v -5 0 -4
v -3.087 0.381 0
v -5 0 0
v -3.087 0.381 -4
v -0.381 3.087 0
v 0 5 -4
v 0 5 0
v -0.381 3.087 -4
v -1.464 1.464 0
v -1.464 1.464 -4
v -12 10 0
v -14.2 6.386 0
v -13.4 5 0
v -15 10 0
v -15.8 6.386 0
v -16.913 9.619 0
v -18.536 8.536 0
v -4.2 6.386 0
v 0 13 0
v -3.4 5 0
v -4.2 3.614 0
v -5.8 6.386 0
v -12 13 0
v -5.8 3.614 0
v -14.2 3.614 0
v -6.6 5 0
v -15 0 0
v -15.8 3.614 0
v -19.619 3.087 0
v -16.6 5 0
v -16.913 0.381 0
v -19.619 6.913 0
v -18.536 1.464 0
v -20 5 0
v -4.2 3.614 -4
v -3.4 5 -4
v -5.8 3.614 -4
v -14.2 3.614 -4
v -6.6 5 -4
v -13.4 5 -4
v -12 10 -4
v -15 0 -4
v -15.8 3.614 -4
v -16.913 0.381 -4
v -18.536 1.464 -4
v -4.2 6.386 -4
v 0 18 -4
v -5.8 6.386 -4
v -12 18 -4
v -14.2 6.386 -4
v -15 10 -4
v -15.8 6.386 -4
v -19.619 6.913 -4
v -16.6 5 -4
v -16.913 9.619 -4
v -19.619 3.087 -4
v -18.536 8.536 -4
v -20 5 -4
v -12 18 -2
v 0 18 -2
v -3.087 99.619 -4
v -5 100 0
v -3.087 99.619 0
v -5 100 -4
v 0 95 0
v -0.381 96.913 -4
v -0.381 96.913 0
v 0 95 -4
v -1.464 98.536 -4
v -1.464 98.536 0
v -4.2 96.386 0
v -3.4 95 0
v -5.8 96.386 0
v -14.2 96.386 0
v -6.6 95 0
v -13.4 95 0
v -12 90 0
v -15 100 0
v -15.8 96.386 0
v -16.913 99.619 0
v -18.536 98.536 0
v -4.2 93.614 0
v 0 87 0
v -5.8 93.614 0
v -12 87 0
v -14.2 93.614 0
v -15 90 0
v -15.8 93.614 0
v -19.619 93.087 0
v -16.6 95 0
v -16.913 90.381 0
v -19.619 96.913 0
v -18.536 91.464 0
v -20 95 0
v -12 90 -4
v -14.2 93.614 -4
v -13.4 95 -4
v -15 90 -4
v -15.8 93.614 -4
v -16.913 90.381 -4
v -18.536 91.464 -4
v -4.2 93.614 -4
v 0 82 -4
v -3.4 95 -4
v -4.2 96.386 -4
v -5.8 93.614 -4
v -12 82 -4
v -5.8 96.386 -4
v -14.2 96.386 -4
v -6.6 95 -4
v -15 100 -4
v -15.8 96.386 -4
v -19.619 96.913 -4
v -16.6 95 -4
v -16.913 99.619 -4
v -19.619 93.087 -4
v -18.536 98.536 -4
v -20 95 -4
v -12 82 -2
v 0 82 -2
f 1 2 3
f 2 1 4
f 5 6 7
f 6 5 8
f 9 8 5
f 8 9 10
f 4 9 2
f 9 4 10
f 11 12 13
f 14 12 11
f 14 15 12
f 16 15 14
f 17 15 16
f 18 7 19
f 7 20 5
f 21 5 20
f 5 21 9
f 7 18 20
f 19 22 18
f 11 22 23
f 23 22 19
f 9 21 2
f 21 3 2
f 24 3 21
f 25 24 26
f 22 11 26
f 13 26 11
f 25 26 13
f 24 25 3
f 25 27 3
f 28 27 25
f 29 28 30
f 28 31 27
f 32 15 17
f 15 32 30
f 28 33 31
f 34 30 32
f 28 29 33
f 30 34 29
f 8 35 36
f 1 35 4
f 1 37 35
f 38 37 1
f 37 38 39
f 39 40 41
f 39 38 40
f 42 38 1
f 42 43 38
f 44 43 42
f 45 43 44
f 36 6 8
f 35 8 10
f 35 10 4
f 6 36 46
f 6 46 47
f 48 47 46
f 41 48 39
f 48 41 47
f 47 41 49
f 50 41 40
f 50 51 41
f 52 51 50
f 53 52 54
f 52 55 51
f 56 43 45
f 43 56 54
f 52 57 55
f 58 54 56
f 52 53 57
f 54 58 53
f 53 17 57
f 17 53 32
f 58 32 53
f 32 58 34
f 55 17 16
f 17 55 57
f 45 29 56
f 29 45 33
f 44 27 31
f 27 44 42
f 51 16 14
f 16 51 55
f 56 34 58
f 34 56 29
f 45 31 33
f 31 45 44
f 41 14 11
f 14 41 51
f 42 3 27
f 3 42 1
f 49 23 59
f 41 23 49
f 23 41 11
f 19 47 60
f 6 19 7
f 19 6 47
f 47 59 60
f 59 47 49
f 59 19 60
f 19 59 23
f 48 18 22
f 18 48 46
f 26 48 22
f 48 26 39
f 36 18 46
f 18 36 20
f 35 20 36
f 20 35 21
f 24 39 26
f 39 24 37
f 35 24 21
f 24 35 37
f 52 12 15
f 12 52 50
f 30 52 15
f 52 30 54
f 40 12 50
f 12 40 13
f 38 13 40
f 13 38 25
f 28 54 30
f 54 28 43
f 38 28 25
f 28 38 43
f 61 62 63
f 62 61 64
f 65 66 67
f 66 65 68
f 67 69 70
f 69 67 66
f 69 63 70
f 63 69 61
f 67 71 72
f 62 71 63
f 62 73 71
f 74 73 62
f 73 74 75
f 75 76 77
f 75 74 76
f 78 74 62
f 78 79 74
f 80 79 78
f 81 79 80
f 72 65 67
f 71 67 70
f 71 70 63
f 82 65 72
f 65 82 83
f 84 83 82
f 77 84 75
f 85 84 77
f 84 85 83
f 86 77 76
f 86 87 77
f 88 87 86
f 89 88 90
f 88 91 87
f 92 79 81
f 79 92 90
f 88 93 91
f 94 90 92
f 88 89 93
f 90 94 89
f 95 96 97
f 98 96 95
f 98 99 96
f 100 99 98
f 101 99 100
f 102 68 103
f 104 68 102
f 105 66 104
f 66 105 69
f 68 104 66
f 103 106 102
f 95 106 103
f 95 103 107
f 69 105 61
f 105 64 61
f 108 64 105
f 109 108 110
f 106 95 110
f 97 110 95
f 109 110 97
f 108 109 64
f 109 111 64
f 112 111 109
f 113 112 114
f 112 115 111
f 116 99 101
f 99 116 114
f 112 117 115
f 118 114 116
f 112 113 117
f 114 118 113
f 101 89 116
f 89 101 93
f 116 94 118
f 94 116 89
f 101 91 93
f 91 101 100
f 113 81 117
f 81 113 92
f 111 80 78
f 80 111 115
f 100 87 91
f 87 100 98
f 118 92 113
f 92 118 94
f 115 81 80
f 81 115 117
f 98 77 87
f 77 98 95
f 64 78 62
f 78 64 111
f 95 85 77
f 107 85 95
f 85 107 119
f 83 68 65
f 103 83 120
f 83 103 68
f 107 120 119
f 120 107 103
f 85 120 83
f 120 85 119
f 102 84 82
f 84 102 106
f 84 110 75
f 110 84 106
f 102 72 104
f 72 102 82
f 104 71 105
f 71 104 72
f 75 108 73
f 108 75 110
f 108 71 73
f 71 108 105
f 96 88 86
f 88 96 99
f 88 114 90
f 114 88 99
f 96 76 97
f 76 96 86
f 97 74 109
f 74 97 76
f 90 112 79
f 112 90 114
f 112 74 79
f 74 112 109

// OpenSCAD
// file: config_4x5.scad
/*
This is the base configuration file for the 4x5" format
# we are not using the exact ANSI measures, but slightly rounded measures for slight simplification
*/
vStabilizerTotal_h = 7;

// general tolerance
vTolerance = 0.2;

// sheet film and cassette measurements (roughly based on the ANSI measurements)
vFilmSheet_l = 127;
vFilmSheet_w = 102;
vCassette_l = 160; // A min
vCassette_w = 121; // B max
vCassette_h = 13.2; // C max
vLightTrap_l = 2; // M2
vLightTrap_w = vCassette_w;
vLightTrap_h = 1.5; // M1
vLightTrap_offsetX = 141; // G max
vFilmWindow_l = 121;
vFilmWindow_w = 101;
vFilmWindow_offsetX = 16;
vGroundGlass_offsetZ = 5;

// Graflok
vGraflok_h = 6; // this is not the official measurement, just measured from a camera 

// lens board measures (we are using Wista/Technika-style lensboards)
vLensboard_l = 100;
vLensboard_w = 97;
vLensboard_h = 2;
vLensboard_offsetX = -(vLensboard_l+3)/2; // caution: we have an asymetric offset!
vLensboard_offsetY = -vLensboard_w/2;
vLensboardHole_d = 85;
vLensboardLighttrap_d = 89;
vLensboardLighttrap_h = 1+vTolerance;

// bellows frame measures - the bellows frame design is derived from standardcameras.com
// back frame
vBellowsBackInner_l = 144; //???? check and replace with the measurement from your bellows!
vBellowsBackInner_w = vBellowsBackInner_l;
vBellowsBackOuter_l = vBellowsBackInner_l+1;
vBellowsBackOuter_w = vBellowsBackOuter_l;

vBellowsBackFrameOuter_l = 159;
vBellowsBackFrameOuter_w = vBellowsBackFrameOuter_l;
vBellowsBackFrameOuter_h = 7;
vBellowsBackFrameInner_l = 135;
vBellowsBackFrameInner_w = vBellowsBackFrameInner_l;
vBellowsBackFrameInner_h = 5;

vBellowsBackLightTrapOuter_l = vBellowsBackFrameInner_l+2*2;
vBellowsBackLightTrapOuter_w = vBellowsBackLightTrapOuter_l;
vBellowsBackLightTrap_h = 3;

//vBellowsBackFrameScrewHole_d = 2;
//vBellowsBackFrameScrewHole_h = 10;
vBellowsBackFrameScrewHole_offsetXY = 70;
vBellowsBackFrameScrewHole_offsetZ = vBellowsBackFrameOuter_h/2;

// front frame
vBellowsFrontInner_l = 94; //???? check and replace with the measurement from your bellows!
vBellowsFrontInner_w = vBellowsFrontInner_l;
vBellowsFrontOuter_l = vBellowsFrontInner_l+1;
vBellowsFrontOuter_w = vBellowsFrontOuter_l;

vBellowsFrontFrameOuter_l = 104;
vBellowsFrontFrameOuter_w = vBellowsFrontFrameOuter_l;
vBellowsFrontFrameOuter_h = 7;
vBellowsFrontFrameInner_l = 82;
vBellowsFrontFrameInner_w = vBellowsFrontFrameInner_l;
vBellowsFrontFrameInner_h = 5;

vBellowsFrontLightTrapOuter_l = vBellowsFrontFrameInner_l+2*2;
vBellowsFrontLightTrapOuter_w = vBellowsFrontLightTrapOuter_l;
vBellowsFrontLightTrap_h = 0;

//vBellowsFrontFrameScrewHole_d = 2;
//vBellowsFrontFrameScrewHole_h = 10;
vBellowsFrontFrameScrewHole_offsetXY = 40;
vBellowsFrontFrameScrewHole_offsetZ = vBellowsFrontFrameOuter_h/2;

// body dimensions
vWall_strength = 5;
vBodyOuter_l = 185; // make sure this is at least 4*vWall_strength larger than vBellowsBackFrameOuter_l!
vBodyOuter_w = 170; // make sure this is at least 2*vWall_strength larger than vBellowsBackFrameOuter_l!
vBodyOuter_h = 65;
vBodyEdge_r = vWall_strength;

// we will center our model on the Y axis and on the center of the bellows frame
// at least for the 4x5 version, we have to do an asymetric offset of 2.5mm on the X-axis 
vAsymOffsetX = -2.5;  

// back plate
vBackPlateLength = 160; // we will probably use about the same size as the bellows back frame
vBackPlateStrength = vWall_strength;

// hinges for front lid
vHingeInnerDistance = 100;
vHingeBaseWidth = 20;
vHingeHole = 4;

// lid lock measures
vLidLockBase_d = 8;
vLidLockHole_distance = 70;

// rail dimensions
vLowerRail_w = 90;
vUpperRail_w = vLowerRail_w;

// cutout for stop indents
vStopIndent_l = 4;
vStopIndent_h = 5;
vStopIndentDistance = 25; // shorter than 25 is not necessary
vStopIndent_offsetX = 20; // don't go shorter than 20 if you intend to use a 90mm lens!

// for all dovetails we use a base width of 5mm and a base height of 5mm
// we are applying tolerances to the inner AND outer part of a dovetail, in width and height
vDoveTail_w = 5;
vDoveTail_h = 5;
vDoveTail_tolerance = 0.2;

// front standard carrier / slider
// width is depending on vUpperRail_w
vSliderBase_w = vUpperRail_w + (4*vDoveTail_w);
vSliderBase_l = 40; // make sure to have enough space in the body.


// lever plate 
vLeverPlateBase_w = vUpperRail_w - (8*vDoveTail_w);
vLeverPlateBlock_w = 25;
vLeverPlateBlock_l = vSliderBase_l-(2*vDoveTail_w);

vFrontStandard_h = 130;
vFrontStandardSlot_h = vFrontStandard_h - 30;

// lensboard carrier
vFrontPlate_length = vSliderBase_w+6; // vSliderBase_w is a bit too tight for 4x5", so there we will add 5mm, for 5x7 vSliderBase_w is OK to get a squared lensboard carrier
vFrontPlate_width = vSliderBase_w; //vFrontPlate_length;
vFrontPlate_height = 16;
vEdgeCutCylinder = floor(sqrt(2*pow(vFrontPlate_width,2)))-5;

vTiltDovetailBase_d1 = 30;
vTiltDovetailBase_d2 = vTiltDovetailBase_d1+(2*vDoveTail_w);
vTiltDovetailBaseBlock_d = vTiltDovetailBase_d1+(4*vDoveTail_w);

vTiltDovetail_d1 = vTiltDovetailBase_d1-vTolerance;
vTiltDovetail_d2 = vTiltDovetailBase_d2-vTolerance;
vTiltDovetail_h = vDoveTail_w-vTolerance;

vTiltDovetailCutout_d1 = vTiltDovetailBase_d2+vTolerance;
vTiltDovetailCutout_d2 = vTiltDovetailBase_d1+vTolerance;

vAxisHole_d = 10+vTolerance;
vAxisHole_h = vDoveTail_w+vTolerance;

vTiltLockBolt_d = 12;
vTiltLockBolt_h = 14;
//vTiltLockBoltHole_d = 8;
//vTiltLockBoltHole_h = vTiltLockBolt_h;

vTiltHeight = 50;
vTiltRadius = vFrontPlate_length/2;
vTiltAngleMinus = -7;
vTiltAnglePlus = 7;
vTiltAxis_d = 10-vTolerance;

// focusing rod
vFocusingRod_d = 6;
vFocusingKnob_d = 25;
vFocusingKnob_h = 20;

// stabilizer measures (just the outer measures of our stabilizer block, not the tripod slider)
vStabilizerBase_l = 135;
vStabilizerBase_w = 90;  
vStabilizerBase_h = 7;
vStabilizerDovetailBase_w = 50;
// screw holes for the stabilizer
vLidHoleCount_x = 4;
vLidHoleDist_x = 35;
vLidHoleCount_y = 2;
vLidHoleDist_y = 60;


// screw diameters, length is individually set
vScrew1Hole_d = 3;
vScrew1ThreadHole_d = 2.2;
vScrew2Hole_d = 2;
vScrew2ThreadHole_d = 1.4;


// Dimensions for small heat set insert holes.
// Sized for M2 inserts, 3 mm depth, 3.5 mm max OD
// (may be labelled M2x3.5x3)
vInsertM2Hole_d = 3.2;
vInsertM2MinDepth_h = 4.0;
vInsertM2Size_d = 3.5;
vInsertM2Depth_h = 3.0;

// Dimensions for heat set insert holes.
// Sized for "Voron standard" M3 inserts, 4 mm depth, 5 mm max OD
// (variously labelled M3x4x5 or M3x5x4)
vInsertM3Hole_d = 4.7;
vInsertM3MinDepth_h = 5.0;
vInsertM3Size_d = 5.0;
vInsertM3Depth_h = 4.0;

// Dimensions for large heat set insert holes.
// Sized for M5 inserts, 5 mm depth, 7 mm max OD
// (may be labelled M5x7x5)
vInsertM5Hole_d = 6.7;
vInsertM5MinDepth_h = 6.0;
vInsertM5Size_d = 7.0;
vInsertM5Depth_h = 5.0;


// Handle strap
vHandleStrap_h = 2.0;       // Thickness of the strap in mm
vHandleStrap_w = 15.0;      // Width of the strap in mm
vHandleStrap_l = 145.0;     // Total length of the strap in mm
vHandleStrapMovement_l = 35.0;   // Total amount the strap moves, in mm. Each side moves half this amount.
vHandleStrapCutout_w = 4.0;      // Width of the central cutout, in mm
vHandleStrapSlotOffsetFar = vHandleStrap_l/2 - vHandleStrap_w/2;
vHandleStrapSlotOffsetNear = vHandleStrapSlotOffsetFar - vHandleStrapMovement_l/2;
vHandleStrapCoverExtra_l = 5.0;
vHandleStrapHoleSize_d = 3.0;
vStrapHoleDelta = vHandleStrapSlotOffsetNear-vHandleStrapCoverExtra_l+vHandleStrapHoleSize_d/2;
vStrapHoleSpacing = vHandleStrapMovement_l/2 + vHandleStrap_w/2;
// file: baseconfig.scad
/*
Here we define some variables which are independent from the camera format
*/


// some generic variables

// we are including a format specific configuration sheet - but make sure to include only one!

include <config_4x5.scad>;
// include <config_5x7.scad>;
// include <config_8x10.scad>;

// Arca Swiss tripod plate
// caution: some Arca Swiss compatible tripod heads may have slight variations
// vArca_length = xx; // the length is irrelevant here
vArca_width = 38;
vArca_height = 7;
vArcaBase_cutout = 4;
vArcaBase_height = 1.5;
// file: modules.scad
/*
This is a collection of the modules which are used heavily within the whole project.
Almost all parts rely on the modules to remain "as is", especially regarding their current orientation.
So please act very carefully here, otherwise you may screw up the complete design!

*/
include <baseconfig.scad>;


// roof module - this is heavily used for dovetail cutouts
// please keep as is
module roof(l, w, h){
    polyhedron(
        points=[
            [0,0,0],
            [l,0,0],
            [l,w,0],
            [0,w,0],
            [0,w/2,h],
            [l,w/2,h]
            ],
        faces=[
            [0,1,2,3],
            [0,4,1],
            [1,4,5,2],
            [2,5,3],
            [3,5,4,0]
            ]
            );
    };

// a wedge module - this is heavily used for cutting edges
// please keep as is    
module wedge(l, w, h) {
    polyhedron(
            points=[
                [0,0,0],
                [l,0,0],
                [l,w,0],
                [0,w,0],
                [0,0,h],
                [l,0,h]
            ],
            faces=[
                [0,3,2,1],
                [0,1,5,4],
                [1,2,5],
                [2,3,4,5],
                [3,0,4]
            ]
    );
   };

// simple tube module.   
module tube(d1, d2, h) {
    difference() {
        cylinder(d=d1, h=h);
        cylinder(d=d2, h=h);
        };
    };

// mainly used for making holes for countersunk screws
// please keep as is    
module countersunk_screw(vScrew_d, vScrew_l){
    union(){
    cylinder(d=vScrew_d, h=vScrew_l);
    cylinder(d1=vScrew_d*2, d2=0, h=vScrew_d);
    };
};

// module for making hexagons, e.g. hex nuts. kw is the key width
// please keep as is
module hex(kw, h) {
	render()
        translate([0, 0, h/2])
            intersection_for(a = [0, 120, 240]) {
                rotate([0, 0, a])
                    cube([kw, 3 * kw, h], true);
                }
}


// Heatset insert
// d: Thread diameter
// od: Outer diameter
// l: Total length
module insert(d, od, l)
{
    echo(Insert = d, od, l);
    difference() {
        cylinder(l, d=od, $fn=15);
        translate([0, 0, -0.5]) cylinder(l+1, d=d, $fn=15);
        };
}

module insert_m2()
{
    color("gold") insert(2, vInsertM2Size_d, vInsertM2Depth_h);
}

module insert_m3()
{
    color("gold") insert(3, vInsertM3Size_d, vInsertM3Depth_h);
}

module insert_m5()
{
    color("gold") insert(5, vInsertM5Size_d, vInsertM5Depth_h);
}

// Countersunk screw, metric, for display
// Example: https://www.aliexpress.com/item/1005007838338973.html
module screw_cs(l, d=3, dk=6, s=2, t=1) {
    // l: total length (including head) in mm
    // d: thread diameter (eg 3 for M3)
    // dk: max head diameter
    // s: hex socket flat-to-flat size
    // t: hex socket depth
    echo(CountersunkScrew = d, l);
    difference() {
        union() {
            cylinder(h=l, r=d/2, $fn=15);
            cylinder(h=(dk-d)/2, r1=dk/2, r2=d/2, $fn=15);
            }
        cylinder(h=t, r=s/2*2/sqrt(3), $fn=6);
    }
}

module screw_m3_cs(l) {
    color("silver") screw_cs(l, d=3, dk=6, s=2, t=1);
}

module screw_m2_cs(l) {
    color("silver") screw_cs(l, d=2, dk=3.8, s=1.5, t=0.75);
}
module screw_m5_cs(l) {
    color("silver") screw_cs(l, d=5, dk=9.5, s=3, t=1.6);
}

// Button head screw, metric, for display
// Example: https://www.aliexpress.com/item/32967225441.html
module screw_bh(l, d=3, k=1.5, dk=5.5, s=2, t=1) {
    // l: shaft length (NOT including head) in mm
    // d: thread diameter (eg 3 for M3)
    // k: head depth
    // dk: head max diameter
    // s: hex socket flat-to-flat size
    // t: hex socket depth
    echo(ButtonheadScrew = d, l);
    difference() {
        union() {
            translate([0, 0, k]) cylinder(h=l, r=d/2, $fn=15);
            difference() {
                translate([0, 0, k]) intersection() {
                    sphere(d=dk, $fn=15);
                    translate([-dk/2, -dk/2, -dk]) cube(dk);
                }
                translate([-dk/2, -dk/2, -dk]) cube(dk);
            }
        }
        cylinder(h=t, r=s/2*2/sqrt(3), $fn=6);
    }
}

module screw_m2_bh(l) {
    color("silver") screw_bh(l, d=2, dk=3.4, s=1.175, t=0.6);
}

module screw_m3_bh(l) {
    color("silver") screw_bh(l, d=3, dk=5.7, s=2, t=1);
}


module nut_m5() {
    echo(Nut = 5);
    difference() {
        rotate([0, 0, 30]) cylinder(h=3.9, d=8*2/sqrt(3), $fn=6);
        cylinder(h=5, d=5, $fn=15);
        }
    }
    
    
module thumbscrew(bolt_d, bolt_dk, screw_d, screw_h, n_knurls, knurl_d, knurl_f) {
    // bolt_d:  central bolt diameter
    // bolt_dk: bolt head max diameter
    // screw_d: thumbscrew outer diameter
    // screw_h: thumbscrew height
    // n_knurls: number of knurls
    
    min_knurl_offset = screw_d/2 - knurl_d;
    max_knurl_offset = screw_d/2 + knurl_d;
    knurl_offset = min_knurl_offset + knurl_f*(max_knurl_offset - min_knurl_offset);
    
    difference()
    {
        union()
        {
            translate([0, 0, 1]) cylinder(screw_h-2, d=screw_d);
            cylinder(1, d1=screw_d-1, d2=screw_d);
            translate([0, 0, screw_h-1]) cylinder(1, d1=screw_d, d2=screw_d-1);
        }
        cylinder(screw_h, d=bolt_d);
        cylinder(bolt_dk/2, d1=bolt_dk, d2=0);
        for (i = [1:n_knurls])
        {
            rotate([0, 0, i*360/(n_knurls)]) translate([knurl_offset, 0, 0]) cylinder(screw_h, d=knurl_d);
        }
    }
}

module thumbscrew_m5(screw_d, screw_h, n_knurls, knurl_d, knurl_f) {
    thumbscrew(5, 9.5, screw_d, screw_h, n_knurls, knurl_d, knurl_f);
}


module t6_flange_coupler() {
    // T6 flange coupler
    // Example: https://www.aliexpress.com/item/1005008049363389.html
    echo(FlangeCoupler = 6);
    difference() {
        union() {
            translate([0, 0, 2]) cylinder(h=10, d=10);
            cylinder(h=2, d=22);
        }
        cylinder(h=12, d=6);
        translate([0, 15, 7]) rotate([90, 0, 0]) cylinder(h=30, d=3);
        for (i = [0:3]) {
            rotate([0, 0, 45+90*i]) translate([-8, 0, 0]) cylinder(h=2, d=3);
        }
    }
}


module AXK0619_thrust_bearing() {
    echo(ThrustBearing = "AXK0619");
    difference() {
        cylinder(h=4, d=19);
        cylinder(h=4, d=6);
    }
}


module t6_lead_screw(l) {
    echo(LeadScrewT6 = l);
    color("silver") cylinder(h=l, d=6);
}

module t6_lead_screw_nut() {
    echo("LeadScrewT6Nut");
    intersection()
    {
        difference() {
            union() {
                cylinder(h=15, d=12);
                translate([0, 0, 1.5]) cylinder(h=3.5, d=24);
            }
            cylinder(h=15, d=6);
        }  
        translate([-50, -12.5/2, -50]) cube([100, 12.5, 100]);
    }
}

module threaded_rod_m5(l) {
    echo(ThreadedRodM5 = l);
    color("silver") cylinder(h=l, d=5);
}

module smooth_rod_m4(l) {
    echo(SmoothRodM4 = l);
    color("silver") cylinder(h=l, d=4);
}


module screw_m3_grub(l) {
    echo(GrubScrew = 3, l);
    color("silver") cylinder(h=l, d=3, $fn=15);
}


module screw_m5_grub(l) {
    echo(GrubScrew = 5, l);
    color("silver") cylinder(h=l, d=5, $fn=15);
}


module washer_m6() {
    // M6x12x0.8 washer
    echo(Washer = 6, 0.8);
    difference() {
        cylinder(h=0.8, d=12);
        cylinder(h=0.8, d=6.6);
    }
}


module springwasher_m6() {
    // M6x12x1.5 washer (compresses to 0.5)
    // Show as compressed (~0.5 mm height)
    echo(SpringWasher = 6);
    difference() {
        cylinder(h=0.5, d=12);
        cylinder(h=0.6, d=6);
    }
}


module chamfer_cylinder(h, d, c=0) {
    if (h >= c) {
        cylinder(h=h-c, d=d);
        translate([0, 0, h-c]) cylinder(h=c, d1=d, d2=d-c);
    } else {
        cylinder(h=h, d=d);
    }
}

module chamfer_cube(w, d, h, c=0) {
    if (h >= c) {
        difference() {
            cube([w, d, h]);
            translate([-c, 0, h]) rotate([0, 45, 0]) cube([sqrt(2)*c, d, sqrt(2)*c]);
            translate([w-c, 0, h]) rotate([0, 45, 0]) cube([sqrt(2)*c, d, sqrt(2)*c]);
            translate([0, 0, h-c]) rotate([45, 0, 0]) cube([w, sqrt(2)*c, sqrt(2)*c]);
            translate([0, d, h-c]) rotate([45, 0, 0]) cube([w, sqrt(2)*c, sqrt(2)*c]);
        }
    } else {
        cube(wdh);
    }
}

module rounded_rect(l, w, h) {
    union()
    {
        translate([-l/2+w/2, 0, 0]) cylinder(h=h, d=w);
        translate([l/2-w/2, 0, 0]) cylinder(h=h, d=w);
        translate([-(l-w)/2, -w/2, 0]) cube([l-w, w, h]);
    }
}
// main file
// some modules such as hex, countersunk screws, roof, wedge are available in a module file
use <modules.scad>;

module locking_rail() {

// variables

vTolerance = 0.2;


vLockingRailBaseRadius_r = 5;
vLockingRailBaseRadius_offsetX1 = vLockingRailBaseRadius_r;
vLockingRailBaseRadius_offsetX2 = vLockingRailBaseRadius_r+10;
vLockingRailBaseRadius_offsetY= vLockingRailBaseRadius_r;
vLockingRailBaseRadius_offsetZ = 0;

vLockingRailBaseBlock_l = 2*vLockingRailBaseRadius_r;
vLockingRailBaseBlock_w = 2*vLockingRailBaseRadius_r;
vLockingRailBaseBlock_h = 4;
vLockingRailBaseBlock_offsetX = vLockingRailBaseRadius_r;
vLockingRailBaseBlock_offsetY = 0;
vLockingRailBaseBlock_offsetZ = 0;

vLockingRailExtension_l = 12;
vLockingRailExtension_w = vLockingRailBaseRadius_r+8;
vLockingRailExtension_h = vLockingRailBaseBlock_h;
vLockingRailExtension_offsetX = 0;
vLockingRailExtension_offsetY = vLockingRailBaseRadius_r;
vLockingRailExtension_offsetZ = 0;

vLockingRailRampCutoff_l = 5;
vLockingRailRampCutoff_w = vLockingRailExtension_l;
vLockingRailRampCutoff_h = 2;
vLockingRailRampCutoff_offsetX = 0;
vLockingRailRampCutoff_offsetY = vLockingRailExtension_w+vLockingRailExtension_offsetY;
vLockingRailRampCutoff_offsetZ = 0;

vScrewHole_d = 3+vTolerance;
vScrewHole_h = vLockingRailBaseBlock_h;

/*
translate([vLockingRailRampCutoff_offsetX, vLockingRailRampCutoff_offsetY, vLockingRailRampCutoff_offsetZ])
wedge(vLockingRailRampCutoff_w, -vLockingRailRampCutoff_l, vLockingRailRampCutoff_h);
*/



difference(){
    union(){
    translate([vLockingRailBaseRadius_offsetX1, vLockingRailBaseRadius_offsetY, vLockingRailBaseRadius_offsetZ])
        cylinder(r = vLockingRailBaseRadius_r, h= vLockingRailBaseBlock_h);
    translate([vLockingRailBaseRadius_offsetX2, vLockingRailBaseRadius_offsetY, vLockingRailBaseRadius_offsetZ])
        cylinder(r = vLockingRailBaseRadius_r, h= vLockingRailBaseBlock_h);
    // base block
    translate([vLockingRailBaseBlock_offsetX, vLockingRailBaseBlock_offsetY, vLockingRailBaseBlock_offsetZ])
        cube([vLockingRailBaseBlock_l, vLockingRailBaseBlock_w, vLockingRailBaseBlock_h]);
    // extension block
    translate([vLockingRailExtension_offsetX, vLockingRailExtension_offsetY, vLockingRailExtension_offsetZ])
        cube([vLockingRailExtension_l, vLockingRailExtension_w, vLockingRailExtension_h]);
    };
    
    // cut off ramp
    translate([vLockingRailRampCutoff_offsetX, vLockingRailRampCutoff_offsetY, vLockingRailRampCutoff_offsetZ])
        wedge(vLockingRailRampCutoff_w, -vLockingRailRampCutoff_l, vLockingRailRampCutoff_h);
    
    // screw holes
    translate([vLockingRailBaseRadius_offsetX1, vLockingRailBaseRadius_offsetY, vLockingRailBaseRadius_offsetZ])
        cylinder(d=vScrewHole_d, h=vScrewHole_h);
    translate([vLockingRailBaseRadius_offsetX2, vLockingRailBaseRadius_offsetY, vLockingRailBaseRadius_offsetZ])
        cylinder(d=vScrewHole_d, h=vScrewHole_h);

};

};

rotate([0, 180, 0]) locking_rail();

translate([0, 100, 0]) rotate([0, 180, 0]) scale([1, -1, 1]) locking_rail();
